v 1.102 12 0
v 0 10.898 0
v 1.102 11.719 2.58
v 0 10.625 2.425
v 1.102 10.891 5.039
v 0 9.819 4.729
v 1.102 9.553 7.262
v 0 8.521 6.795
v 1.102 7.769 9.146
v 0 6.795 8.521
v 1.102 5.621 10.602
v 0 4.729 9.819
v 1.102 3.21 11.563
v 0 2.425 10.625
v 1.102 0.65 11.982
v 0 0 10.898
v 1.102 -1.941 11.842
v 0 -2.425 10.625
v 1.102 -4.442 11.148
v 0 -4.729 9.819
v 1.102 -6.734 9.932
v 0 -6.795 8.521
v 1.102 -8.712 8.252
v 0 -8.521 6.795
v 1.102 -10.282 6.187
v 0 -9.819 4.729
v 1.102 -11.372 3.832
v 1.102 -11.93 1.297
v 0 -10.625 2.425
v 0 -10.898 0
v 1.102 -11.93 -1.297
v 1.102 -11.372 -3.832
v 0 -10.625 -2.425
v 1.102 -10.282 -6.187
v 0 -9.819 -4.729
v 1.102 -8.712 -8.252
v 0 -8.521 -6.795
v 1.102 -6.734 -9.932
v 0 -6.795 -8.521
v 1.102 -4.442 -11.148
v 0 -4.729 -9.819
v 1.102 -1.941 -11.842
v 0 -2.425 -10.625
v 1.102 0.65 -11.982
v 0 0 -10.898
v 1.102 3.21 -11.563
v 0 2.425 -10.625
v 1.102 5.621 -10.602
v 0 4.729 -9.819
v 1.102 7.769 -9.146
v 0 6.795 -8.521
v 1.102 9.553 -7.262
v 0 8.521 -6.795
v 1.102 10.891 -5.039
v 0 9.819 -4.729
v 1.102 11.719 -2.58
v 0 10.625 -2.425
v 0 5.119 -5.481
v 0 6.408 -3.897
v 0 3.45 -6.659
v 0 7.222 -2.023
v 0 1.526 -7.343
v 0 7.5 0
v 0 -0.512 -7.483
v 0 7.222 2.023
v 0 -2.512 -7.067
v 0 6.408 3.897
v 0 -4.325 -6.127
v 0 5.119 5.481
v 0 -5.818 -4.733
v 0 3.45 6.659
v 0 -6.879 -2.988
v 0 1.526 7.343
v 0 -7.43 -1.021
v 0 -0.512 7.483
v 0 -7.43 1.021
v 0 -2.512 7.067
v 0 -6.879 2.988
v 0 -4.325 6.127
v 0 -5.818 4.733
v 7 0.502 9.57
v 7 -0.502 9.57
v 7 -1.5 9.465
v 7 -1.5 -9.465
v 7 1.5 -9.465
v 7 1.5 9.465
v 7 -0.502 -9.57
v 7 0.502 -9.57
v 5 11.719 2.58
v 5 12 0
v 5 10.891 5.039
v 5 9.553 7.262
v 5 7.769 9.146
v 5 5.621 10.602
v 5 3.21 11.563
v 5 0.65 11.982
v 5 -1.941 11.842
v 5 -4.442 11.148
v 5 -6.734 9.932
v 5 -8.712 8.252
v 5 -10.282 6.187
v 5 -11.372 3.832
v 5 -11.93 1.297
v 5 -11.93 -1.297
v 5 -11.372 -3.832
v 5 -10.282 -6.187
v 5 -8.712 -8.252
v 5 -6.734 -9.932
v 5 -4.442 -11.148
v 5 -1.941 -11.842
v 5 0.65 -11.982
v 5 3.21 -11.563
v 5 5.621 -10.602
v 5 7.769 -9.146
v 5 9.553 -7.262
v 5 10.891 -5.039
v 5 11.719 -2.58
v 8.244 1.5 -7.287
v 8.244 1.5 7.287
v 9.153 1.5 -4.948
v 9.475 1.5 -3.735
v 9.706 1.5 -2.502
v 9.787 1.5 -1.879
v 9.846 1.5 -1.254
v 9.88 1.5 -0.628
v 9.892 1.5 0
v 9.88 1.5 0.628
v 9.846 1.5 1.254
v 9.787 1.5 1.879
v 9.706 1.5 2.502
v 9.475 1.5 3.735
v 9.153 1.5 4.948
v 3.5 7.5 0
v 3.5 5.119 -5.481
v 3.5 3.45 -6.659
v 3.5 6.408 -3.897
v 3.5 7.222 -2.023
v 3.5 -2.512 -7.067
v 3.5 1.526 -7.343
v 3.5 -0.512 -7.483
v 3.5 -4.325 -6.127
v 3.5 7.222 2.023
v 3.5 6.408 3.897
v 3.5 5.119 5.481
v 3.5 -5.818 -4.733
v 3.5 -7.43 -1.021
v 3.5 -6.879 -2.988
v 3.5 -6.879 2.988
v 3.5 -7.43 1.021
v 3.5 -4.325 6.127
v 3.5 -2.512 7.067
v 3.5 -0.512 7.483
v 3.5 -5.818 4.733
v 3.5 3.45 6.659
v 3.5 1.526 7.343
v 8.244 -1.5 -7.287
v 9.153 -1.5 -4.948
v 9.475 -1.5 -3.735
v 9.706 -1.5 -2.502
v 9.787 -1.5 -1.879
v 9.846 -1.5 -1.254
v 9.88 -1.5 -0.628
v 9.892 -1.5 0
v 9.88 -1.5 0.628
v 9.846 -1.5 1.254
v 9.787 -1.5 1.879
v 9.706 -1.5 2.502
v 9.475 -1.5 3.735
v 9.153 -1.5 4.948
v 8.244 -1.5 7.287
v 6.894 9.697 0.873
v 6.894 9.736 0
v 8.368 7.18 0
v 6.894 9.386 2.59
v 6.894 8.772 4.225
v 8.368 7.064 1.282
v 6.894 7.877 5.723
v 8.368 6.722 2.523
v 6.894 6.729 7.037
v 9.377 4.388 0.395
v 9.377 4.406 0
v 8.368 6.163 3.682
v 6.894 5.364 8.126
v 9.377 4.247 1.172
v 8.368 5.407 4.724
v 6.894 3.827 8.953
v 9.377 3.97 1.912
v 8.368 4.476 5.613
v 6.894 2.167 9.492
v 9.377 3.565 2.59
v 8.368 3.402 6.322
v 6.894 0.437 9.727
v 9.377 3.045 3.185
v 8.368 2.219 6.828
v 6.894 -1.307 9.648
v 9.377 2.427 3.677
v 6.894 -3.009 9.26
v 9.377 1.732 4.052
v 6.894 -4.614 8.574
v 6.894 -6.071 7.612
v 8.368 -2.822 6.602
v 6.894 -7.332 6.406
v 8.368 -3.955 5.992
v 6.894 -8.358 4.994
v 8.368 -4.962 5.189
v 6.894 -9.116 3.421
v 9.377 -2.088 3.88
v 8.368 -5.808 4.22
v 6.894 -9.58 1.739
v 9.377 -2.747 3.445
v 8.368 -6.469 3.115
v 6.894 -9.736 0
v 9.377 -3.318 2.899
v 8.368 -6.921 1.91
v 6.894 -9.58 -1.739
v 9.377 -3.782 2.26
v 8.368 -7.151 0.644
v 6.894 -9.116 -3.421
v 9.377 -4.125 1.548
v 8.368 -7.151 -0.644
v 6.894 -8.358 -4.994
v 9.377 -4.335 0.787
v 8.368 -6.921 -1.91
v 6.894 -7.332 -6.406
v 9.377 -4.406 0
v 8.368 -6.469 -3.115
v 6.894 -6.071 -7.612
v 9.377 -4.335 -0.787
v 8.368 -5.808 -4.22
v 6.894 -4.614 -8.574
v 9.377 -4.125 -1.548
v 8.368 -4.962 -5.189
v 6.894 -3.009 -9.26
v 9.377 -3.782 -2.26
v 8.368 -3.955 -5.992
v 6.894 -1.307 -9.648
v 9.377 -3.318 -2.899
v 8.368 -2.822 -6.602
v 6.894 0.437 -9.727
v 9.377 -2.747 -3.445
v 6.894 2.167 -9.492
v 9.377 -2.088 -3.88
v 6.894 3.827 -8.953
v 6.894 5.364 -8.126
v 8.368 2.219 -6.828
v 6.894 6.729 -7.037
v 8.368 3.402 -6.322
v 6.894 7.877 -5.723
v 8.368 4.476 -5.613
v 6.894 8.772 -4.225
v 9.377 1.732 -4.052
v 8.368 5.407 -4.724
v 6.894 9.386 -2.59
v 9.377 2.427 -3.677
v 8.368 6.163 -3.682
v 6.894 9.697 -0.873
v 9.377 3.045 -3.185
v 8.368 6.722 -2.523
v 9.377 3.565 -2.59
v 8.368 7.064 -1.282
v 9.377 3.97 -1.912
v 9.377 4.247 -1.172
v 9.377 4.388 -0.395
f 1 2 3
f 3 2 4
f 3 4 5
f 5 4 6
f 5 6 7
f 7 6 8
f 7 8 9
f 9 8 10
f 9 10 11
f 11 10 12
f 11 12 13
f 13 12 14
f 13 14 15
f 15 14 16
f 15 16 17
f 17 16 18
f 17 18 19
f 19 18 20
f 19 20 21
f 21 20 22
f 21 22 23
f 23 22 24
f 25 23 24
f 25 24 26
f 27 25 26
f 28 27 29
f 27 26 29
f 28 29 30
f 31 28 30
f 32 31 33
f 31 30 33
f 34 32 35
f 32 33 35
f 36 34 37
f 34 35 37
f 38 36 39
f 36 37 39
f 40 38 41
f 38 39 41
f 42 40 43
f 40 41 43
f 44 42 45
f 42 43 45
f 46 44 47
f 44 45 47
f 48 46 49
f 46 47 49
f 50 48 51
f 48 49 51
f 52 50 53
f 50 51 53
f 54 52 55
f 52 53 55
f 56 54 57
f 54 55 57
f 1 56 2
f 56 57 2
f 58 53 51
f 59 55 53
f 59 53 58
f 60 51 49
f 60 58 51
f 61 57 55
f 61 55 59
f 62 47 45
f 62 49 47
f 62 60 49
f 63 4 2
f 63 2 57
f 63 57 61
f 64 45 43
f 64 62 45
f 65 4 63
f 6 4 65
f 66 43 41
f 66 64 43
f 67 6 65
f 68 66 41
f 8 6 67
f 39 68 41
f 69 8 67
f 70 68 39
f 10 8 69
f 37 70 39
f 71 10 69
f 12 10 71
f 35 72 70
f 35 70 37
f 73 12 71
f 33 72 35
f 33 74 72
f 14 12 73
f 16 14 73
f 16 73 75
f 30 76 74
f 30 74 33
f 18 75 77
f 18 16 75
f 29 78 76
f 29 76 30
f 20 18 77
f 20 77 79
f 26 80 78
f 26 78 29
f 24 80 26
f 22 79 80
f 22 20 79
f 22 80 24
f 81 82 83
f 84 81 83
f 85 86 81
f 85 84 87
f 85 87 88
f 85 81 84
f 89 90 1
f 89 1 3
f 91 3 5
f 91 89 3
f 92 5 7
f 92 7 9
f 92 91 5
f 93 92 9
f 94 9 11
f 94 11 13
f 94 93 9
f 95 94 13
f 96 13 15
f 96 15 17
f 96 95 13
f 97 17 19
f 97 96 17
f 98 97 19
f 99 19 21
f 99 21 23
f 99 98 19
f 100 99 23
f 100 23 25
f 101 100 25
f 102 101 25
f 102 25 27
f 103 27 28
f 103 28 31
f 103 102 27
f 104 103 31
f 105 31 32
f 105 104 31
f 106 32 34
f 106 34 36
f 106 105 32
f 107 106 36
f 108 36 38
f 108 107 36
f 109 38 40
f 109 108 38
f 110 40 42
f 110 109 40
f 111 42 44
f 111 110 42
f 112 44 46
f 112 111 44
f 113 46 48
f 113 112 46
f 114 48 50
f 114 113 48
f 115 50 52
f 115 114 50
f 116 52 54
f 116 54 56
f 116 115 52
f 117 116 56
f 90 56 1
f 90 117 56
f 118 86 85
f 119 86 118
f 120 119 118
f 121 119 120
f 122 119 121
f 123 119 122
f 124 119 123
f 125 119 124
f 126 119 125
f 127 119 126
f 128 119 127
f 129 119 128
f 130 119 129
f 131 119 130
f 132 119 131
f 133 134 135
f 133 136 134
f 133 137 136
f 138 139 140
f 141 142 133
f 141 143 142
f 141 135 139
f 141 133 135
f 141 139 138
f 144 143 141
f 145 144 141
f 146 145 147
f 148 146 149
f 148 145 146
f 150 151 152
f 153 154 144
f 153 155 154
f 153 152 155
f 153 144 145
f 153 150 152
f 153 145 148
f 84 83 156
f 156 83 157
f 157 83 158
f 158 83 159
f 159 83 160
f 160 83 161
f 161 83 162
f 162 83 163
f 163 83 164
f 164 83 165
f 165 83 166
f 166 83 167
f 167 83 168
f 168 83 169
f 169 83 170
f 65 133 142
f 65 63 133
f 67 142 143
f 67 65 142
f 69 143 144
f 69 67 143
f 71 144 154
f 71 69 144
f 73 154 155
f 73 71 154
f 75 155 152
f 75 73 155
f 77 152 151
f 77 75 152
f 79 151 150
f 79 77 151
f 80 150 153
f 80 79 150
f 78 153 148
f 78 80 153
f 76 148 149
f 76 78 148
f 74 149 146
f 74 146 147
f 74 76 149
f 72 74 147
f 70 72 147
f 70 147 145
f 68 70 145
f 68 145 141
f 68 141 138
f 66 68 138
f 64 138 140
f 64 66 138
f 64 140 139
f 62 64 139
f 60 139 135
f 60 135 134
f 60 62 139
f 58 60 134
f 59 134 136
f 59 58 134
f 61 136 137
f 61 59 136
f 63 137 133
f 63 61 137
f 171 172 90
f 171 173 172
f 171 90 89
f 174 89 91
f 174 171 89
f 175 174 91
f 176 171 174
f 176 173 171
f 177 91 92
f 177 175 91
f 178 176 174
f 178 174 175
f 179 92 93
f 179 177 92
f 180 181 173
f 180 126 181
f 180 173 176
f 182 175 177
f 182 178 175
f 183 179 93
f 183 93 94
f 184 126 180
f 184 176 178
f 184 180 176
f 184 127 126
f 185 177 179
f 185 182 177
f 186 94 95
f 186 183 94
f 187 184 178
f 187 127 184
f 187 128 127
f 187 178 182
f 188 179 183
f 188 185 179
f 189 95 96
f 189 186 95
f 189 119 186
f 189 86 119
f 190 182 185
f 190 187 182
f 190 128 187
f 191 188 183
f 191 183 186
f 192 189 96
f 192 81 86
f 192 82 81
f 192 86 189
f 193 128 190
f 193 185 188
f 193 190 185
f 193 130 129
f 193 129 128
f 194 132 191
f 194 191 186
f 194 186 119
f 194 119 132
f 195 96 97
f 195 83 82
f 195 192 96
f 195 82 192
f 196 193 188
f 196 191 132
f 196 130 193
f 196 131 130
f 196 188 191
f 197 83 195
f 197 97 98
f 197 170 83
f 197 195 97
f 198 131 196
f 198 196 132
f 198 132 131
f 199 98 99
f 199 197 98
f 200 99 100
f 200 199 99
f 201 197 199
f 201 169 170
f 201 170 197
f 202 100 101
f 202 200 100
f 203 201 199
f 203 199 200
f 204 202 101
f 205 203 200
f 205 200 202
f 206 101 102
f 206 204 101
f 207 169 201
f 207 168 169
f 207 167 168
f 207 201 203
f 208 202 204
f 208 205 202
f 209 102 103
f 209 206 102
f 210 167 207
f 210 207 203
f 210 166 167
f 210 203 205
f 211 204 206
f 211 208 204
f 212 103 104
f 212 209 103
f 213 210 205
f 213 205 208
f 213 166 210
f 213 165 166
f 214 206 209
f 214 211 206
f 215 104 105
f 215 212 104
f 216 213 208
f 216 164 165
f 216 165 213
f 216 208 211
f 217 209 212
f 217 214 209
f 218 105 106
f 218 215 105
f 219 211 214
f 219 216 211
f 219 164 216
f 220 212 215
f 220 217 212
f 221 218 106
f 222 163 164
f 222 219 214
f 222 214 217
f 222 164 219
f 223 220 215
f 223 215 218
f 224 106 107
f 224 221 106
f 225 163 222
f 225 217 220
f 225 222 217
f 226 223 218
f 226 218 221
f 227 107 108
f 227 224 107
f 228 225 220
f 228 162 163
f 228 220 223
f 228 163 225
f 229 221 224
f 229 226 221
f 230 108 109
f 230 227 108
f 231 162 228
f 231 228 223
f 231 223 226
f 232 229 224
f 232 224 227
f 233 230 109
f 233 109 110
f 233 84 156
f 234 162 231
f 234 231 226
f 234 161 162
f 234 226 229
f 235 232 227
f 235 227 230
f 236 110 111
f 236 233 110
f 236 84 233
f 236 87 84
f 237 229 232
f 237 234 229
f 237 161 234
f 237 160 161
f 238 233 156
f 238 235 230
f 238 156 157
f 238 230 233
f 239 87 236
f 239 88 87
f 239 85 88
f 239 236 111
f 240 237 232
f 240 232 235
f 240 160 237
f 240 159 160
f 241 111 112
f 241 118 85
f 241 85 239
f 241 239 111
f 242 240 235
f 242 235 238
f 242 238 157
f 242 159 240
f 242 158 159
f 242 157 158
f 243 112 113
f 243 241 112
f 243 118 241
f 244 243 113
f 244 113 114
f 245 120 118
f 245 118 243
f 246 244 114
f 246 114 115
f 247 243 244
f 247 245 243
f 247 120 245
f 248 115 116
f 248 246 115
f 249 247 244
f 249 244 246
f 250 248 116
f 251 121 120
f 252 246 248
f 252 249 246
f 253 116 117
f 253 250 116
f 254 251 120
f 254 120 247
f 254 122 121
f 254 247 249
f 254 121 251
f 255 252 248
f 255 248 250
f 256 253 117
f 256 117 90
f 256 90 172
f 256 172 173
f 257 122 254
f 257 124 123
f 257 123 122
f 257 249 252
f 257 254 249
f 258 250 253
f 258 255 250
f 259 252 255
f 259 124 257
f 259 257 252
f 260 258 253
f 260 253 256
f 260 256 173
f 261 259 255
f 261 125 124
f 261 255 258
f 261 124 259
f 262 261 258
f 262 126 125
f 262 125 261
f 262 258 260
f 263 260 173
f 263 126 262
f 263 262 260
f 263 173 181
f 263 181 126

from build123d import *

# Parameters (mm, degrees)
CHAMFER_1_SIZE      = 1.1015
SKETCH_2_W          = 50
SKETCH_2_H          = 3
CUT_EXTRUDE_1_DEPTH = 3.892099643


with BuildPart() as part:
    # Эскиз1 → Повернуть1 (revolve)
    with BuildSketch(Plane.XY):
        with BuildLine():
            Line((0, 12), (5, 12))
            ThreePointArc((5, 12), (8.36795896, 7.179530606), (9.892099643, 1.5))
            Line((9.892099643, 1.5), (7, 1.5))
            Line((7, 1.5), (7, 0))
            Line((7, 0), (3.5, 0))
            Line((3.5, 0), (3.5, 7.5))
            Line((3.5, 7.5), (0, 7.5))
            Line((0, 7.5), (0, 12))
        make_face()
    revolve(axis=Axis((0, 0, 0), (1, 0, 0)))

    # Фаска1
    chamfer_1_edges = [part.edges().sort_by_distance(p)[0] for p in [
        (0, -12, 0),
    ]]
    chamfer(chamfer_1_edges, length=CHAMFER_1_SIZE)

    # Эскиз2 → Вырез-Вытянуть1 (cut, through all)
    with BuildSketch(Plane(origin=(7, 0, 0), x_dir=(0, 0, -1), z_dir=(1, 0, 0))):
        Rectangle(SKETCH_2_W, SKETCH_2_H)
    extrude(amount=CUT_EXTRUDE_1_DEPTH, mode=Mode.SUBTRACT)


solid = part.part
